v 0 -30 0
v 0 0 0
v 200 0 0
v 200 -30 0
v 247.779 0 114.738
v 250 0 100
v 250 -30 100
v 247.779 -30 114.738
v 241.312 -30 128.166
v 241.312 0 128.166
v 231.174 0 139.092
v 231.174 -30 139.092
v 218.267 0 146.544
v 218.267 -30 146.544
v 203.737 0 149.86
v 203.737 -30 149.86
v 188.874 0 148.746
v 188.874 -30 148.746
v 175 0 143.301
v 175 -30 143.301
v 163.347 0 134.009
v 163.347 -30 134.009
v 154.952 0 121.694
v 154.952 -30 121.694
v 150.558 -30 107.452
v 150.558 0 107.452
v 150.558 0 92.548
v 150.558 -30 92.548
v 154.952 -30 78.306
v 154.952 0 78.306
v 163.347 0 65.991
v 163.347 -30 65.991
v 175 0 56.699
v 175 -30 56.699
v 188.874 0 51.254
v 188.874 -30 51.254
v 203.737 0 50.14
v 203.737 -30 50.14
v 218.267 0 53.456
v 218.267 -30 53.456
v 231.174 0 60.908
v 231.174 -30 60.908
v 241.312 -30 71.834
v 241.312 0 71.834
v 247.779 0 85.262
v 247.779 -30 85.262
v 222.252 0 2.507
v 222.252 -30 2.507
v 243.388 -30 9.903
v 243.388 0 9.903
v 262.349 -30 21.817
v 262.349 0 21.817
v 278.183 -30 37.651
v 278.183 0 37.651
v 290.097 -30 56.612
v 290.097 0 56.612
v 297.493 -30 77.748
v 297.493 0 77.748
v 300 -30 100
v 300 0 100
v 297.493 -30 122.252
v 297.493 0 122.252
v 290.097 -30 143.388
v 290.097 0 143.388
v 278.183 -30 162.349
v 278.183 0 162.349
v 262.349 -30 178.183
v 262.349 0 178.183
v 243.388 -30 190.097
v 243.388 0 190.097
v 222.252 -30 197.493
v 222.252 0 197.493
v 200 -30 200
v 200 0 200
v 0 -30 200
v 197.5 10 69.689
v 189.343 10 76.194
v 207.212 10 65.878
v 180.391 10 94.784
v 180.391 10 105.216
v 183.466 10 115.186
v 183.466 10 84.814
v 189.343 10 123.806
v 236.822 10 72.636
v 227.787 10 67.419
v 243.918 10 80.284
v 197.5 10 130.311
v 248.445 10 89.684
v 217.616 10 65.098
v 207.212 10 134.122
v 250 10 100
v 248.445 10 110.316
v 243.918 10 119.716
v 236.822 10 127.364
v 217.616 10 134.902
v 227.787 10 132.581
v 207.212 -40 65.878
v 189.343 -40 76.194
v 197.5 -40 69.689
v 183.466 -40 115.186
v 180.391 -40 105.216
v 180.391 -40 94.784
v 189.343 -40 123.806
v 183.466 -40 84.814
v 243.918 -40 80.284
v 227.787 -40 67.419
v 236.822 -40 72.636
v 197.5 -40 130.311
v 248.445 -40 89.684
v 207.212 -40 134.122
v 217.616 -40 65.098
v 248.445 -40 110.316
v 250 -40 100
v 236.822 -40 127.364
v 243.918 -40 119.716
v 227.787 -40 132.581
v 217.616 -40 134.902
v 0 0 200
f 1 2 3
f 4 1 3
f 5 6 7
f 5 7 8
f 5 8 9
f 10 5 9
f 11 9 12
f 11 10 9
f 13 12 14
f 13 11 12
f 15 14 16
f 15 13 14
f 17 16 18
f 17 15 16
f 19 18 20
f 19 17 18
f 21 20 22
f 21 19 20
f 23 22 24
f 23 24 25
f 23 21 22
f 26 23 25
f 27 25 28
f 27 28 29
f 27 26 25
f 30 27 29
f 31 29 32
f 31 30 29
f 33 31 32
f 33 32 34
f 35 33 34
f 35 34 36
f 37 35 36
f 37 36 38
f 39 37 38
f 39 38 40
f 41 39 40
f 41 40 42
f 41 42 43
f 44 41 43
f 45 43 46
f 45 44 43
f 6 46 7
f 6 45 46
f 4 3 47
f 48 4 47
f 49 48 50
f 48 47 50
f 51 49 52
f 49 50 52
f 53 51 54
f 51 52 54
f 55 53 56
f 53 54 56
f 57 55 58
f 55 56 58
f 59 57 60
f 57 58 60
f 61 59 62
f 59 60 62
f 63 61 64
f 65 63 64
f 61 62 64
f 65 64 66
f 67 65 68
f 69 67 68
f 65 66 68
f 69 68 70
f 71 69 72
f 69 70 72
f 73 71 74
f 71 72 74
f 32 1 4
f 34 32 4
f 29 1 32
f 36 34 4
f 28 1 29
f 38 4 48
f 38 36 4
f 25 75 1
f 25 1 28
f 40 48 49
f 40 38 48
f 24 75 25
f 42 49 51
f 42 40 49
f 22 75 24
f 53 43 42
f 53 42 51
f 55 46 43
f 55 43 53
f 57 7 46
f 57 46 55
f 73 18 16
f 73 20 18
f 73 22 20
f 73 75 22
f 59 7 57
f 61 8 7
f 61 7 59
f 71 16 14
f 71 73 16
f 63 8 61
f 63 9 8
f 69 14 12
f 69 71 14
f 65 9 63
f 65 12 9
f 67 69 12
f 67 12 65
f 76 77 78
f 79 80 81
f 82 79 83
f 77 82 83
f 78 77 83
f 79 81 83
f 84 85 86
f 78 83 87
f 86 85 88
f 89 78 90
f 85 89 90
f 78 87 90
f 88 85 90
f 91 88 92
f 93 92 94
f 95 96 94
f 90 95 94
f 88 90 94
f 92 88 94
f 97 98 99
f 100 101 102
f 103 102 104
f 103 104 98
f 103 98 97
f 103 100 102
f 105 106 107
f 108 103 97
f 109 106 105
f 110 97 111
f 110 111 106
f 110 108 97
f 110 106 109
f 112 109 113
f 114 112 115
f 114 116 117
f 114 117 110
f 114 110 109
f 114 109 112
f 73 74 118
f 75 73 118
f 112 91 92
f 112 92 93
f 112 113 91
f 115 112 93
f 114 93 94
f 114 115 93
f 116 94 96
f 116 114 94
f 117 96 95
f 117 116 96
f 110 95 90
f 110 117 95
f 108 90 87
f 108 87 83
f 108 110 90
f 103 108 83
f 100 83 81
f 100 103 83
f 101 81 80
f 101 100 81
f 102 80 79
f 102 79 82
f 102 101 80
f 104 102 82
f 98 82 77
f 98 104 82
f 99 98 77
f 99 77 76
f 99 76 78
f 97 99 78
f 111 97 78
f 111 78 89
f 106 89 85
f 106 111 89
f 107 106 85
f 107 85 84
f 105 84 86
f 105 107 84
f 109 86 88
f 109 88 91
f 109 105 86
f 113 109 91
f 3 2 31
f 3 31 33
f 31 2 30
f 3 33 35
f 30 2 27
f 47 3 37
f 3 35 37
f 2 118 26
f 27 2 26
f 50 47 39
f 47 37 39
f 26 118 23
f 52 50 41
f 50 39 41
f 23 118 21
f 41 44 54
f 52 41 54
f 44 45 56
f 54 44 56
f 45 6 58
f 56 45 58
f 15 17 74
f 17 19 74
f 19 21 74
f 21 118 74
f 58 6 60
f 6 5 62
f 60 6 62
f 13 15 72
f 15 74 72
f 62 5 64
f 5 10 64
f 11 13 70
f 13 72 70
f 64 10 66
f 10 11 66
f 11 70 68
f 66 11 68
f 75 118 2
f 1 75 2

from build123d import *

# Parameters (mm, degrees)
F0_R          = 50
F1_DEPTH      = 30
F0_R_2        = 35
F2_DEPTH      = 40
F2_DEPTH_BACK = 10


with BuildPart() as f1:
    # F0 (on Front) → F1 (new body)
    with BuildSketch(Plane.XZ):
        with BuildLine():
            Line((0, 200), (0, 0))
            Line((0, 0), (200, 0))
            ThreePointArc((200, 0), (300, 100), (200, 200))
            Line((200, 200), (0, 200))
        make_face()
        with Locations((200, 100)):
            Circle(F0_R, mode=Mode.SUBTRACT)
    extrude(amount=F1_DEPTH)


with BuildPart() as f2:
    # F0 (on Front) → F2 (new body, two sides)
    with BuildSketch(Plane.XZ) as f2_sk:
        with Locations((215, 100)):
            Circle(F0_R_2)
    extrude(amount=F2_DEPTH)
    extrude(f2_sk.sketch, amount=-F2_DEPTH_BACK)


solid = Compound([f1.part, f2.part])
